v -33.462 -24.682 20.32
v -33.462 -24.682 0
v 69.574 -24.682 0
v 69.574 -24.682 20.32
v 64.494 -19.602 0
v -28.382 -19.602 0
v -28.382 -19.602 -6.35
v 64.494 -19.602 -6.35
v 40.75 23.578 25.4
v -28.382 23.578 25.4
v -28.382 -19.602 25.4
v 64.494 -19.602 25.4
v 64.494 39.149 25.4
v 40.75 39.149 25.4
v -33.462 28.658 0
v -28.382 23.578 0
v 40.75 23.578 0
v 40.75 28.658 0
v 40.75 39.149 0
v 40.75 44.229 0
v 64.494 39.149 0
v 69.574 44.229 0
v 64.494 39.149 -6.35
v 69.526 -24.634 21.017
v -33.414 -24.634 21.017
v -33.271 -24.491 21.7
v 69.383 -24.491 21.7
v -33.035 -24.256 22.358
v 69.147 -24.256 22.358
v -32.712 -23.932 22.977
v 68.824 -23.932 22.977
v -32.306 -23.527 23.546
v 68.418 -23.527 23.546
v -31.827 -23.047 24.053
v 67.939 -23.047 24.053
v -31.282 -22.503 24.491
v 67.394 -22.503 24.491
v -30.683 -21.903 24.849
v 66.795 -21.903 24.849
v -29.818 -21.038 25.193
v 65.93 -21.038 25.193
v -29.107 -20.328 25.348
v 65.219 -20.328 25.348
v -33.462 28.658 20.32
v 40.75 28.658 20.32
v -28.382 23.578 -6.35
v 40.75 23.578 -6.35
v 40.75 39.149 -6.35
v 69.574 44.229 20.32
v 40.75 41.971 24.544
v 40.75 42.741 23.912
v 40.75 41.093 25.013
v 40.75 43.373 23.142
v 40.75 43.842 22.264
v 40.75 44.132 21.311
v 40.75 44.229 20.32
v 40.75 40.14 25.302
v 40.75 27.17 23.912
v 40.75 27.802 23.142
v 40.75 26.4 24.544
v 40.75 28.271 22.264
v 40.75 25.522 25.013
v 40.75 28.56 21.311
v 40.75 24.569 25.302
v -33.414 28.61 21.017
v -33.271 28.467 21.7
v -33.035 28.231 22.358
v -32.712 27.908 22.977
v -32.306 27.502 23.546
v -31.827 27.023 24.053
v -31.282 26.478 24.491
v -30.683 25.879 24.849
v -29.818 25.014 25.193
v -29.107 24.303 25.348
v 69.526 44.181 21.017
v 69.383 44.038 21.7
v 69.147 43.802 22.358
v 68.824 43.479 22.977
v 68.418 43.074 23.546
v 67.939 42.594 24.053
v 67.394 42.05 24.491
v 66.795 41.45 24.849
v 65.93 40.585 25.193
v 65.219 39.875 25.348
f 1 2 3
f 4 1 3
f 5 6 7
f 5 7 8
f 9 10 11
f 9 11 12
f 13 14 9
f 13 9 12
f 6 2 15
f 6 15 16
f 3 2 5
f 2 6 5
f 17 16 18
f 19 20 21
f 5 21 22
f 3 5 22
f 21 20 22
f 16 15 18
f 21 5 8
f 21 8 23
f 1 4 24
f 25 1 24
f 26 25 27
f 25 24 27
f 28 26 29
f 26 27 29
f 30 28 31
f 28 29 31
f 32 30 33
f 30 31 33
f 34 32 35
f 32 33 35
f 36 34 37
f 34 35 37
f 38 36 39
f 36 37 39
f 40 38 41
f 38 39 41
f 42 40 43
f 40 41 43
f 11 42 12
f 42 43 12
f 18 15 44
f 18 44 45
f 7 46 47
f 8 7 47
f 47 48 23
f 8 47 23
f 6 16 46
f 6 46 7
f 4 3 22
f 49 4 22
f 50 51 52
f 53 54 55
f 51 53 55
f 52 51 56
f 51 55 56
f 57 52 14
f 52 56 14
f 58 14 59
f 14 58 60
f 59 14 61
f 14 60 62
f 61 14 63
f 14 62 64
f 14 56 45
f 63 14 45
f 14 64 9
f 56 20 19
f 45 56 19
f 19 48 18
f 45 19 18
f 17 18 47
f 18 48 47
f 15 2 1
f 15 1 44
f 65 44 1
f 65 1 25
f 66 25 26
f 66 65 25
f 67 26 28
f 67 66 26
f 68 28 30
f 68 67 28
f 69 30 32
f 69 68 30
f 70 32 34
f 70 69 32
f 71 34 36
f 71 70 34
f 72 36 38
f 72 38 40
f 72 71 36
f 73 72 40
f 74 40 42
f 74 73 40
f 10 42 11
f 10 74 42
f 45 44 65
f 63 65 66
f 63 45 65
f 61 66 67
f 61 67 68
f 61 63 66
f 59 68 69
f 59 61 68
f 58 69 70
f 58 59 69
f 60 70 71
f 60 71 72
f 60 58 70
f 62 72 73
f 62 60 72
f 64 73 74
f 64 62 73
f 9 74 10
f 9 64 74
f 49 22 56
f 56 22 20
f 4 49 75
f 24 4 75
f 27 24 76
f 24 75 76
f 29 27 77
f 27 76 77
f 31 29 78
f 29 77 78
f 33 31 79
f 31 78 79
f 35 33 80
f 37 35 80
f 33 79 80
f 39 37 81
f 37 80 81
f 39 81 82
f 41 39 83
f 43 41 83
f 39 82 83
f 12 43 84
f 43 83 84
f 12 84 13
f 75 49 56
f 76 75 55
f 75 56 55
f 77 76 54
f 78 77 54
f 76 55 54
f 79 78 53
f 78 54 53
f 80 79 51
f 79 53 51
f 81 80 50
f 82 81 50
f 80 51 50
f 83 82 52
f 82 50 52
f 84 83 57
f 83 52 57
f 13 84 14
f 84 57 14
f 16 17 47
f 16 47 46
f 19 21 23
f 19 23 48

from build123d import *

# Parameters (mm, degrees)
F0_W     = 74.2121748626
F0_H     = 53.3399991691
F1_DEPTH = 25.4
F2_R     = 5.08
F3_R     = 13.6810571513
F4_DEPTH = 31.75


with BuildPart() as f1:
    # F0 (on Top) → F1 (new body)
    with BuildSketch(Plane.XY):
        with Locations((3.6443490535, 1.9878260791)):
            Rectangle(F0_W, F0_H)
        Polygon((40.7504364848, 44.229131192), (40.7504364848, 28.6578256637), (40.7504364848, -24.6821735054), (69.5739164948, -24.6821735054), (69.5739164948, 44.229131192), align=None)
    extrude(amount=F1_DEPTH)

    # F2
    f2_edges = [f1.edges().sort_by_distance(p)[0] for p in [
        (-33.461738, 1.987826, 25.4),
        (3.644349, 28.657826, 25.4),
        (55.162176, 44.229131, 25.4),
        (18.056089, -24.682174, 25.4),
        (69.573916, 9.773479, 25.4),
    ]]
    fillet(f2_edges, radius=F2_R)

    # F3 (on face) → F4 (join)
    with BuildSketch(Plane.XY.offset(25.4)):
        Polygon((64.4939164948, 39.149131192), (40.7504364848, 39.149131192), (40.7504364848, 28.6578256637), (40.7504364848, 23.5778256637), (-28.3817383778, 23.5778256637), (-28.3817383778, -19.6021735054), (64.4939164948, -19.6021735054), align=None)
        with Locations((20.3587319702, 0)):
            Circle(F3_R, mode=Mode.SUBTRACT)
        with Locations((20.3587319702, 0)):
            Circle(F3_R)
    extrude(amount=-F4_DEPTH)


solid = f1.part
